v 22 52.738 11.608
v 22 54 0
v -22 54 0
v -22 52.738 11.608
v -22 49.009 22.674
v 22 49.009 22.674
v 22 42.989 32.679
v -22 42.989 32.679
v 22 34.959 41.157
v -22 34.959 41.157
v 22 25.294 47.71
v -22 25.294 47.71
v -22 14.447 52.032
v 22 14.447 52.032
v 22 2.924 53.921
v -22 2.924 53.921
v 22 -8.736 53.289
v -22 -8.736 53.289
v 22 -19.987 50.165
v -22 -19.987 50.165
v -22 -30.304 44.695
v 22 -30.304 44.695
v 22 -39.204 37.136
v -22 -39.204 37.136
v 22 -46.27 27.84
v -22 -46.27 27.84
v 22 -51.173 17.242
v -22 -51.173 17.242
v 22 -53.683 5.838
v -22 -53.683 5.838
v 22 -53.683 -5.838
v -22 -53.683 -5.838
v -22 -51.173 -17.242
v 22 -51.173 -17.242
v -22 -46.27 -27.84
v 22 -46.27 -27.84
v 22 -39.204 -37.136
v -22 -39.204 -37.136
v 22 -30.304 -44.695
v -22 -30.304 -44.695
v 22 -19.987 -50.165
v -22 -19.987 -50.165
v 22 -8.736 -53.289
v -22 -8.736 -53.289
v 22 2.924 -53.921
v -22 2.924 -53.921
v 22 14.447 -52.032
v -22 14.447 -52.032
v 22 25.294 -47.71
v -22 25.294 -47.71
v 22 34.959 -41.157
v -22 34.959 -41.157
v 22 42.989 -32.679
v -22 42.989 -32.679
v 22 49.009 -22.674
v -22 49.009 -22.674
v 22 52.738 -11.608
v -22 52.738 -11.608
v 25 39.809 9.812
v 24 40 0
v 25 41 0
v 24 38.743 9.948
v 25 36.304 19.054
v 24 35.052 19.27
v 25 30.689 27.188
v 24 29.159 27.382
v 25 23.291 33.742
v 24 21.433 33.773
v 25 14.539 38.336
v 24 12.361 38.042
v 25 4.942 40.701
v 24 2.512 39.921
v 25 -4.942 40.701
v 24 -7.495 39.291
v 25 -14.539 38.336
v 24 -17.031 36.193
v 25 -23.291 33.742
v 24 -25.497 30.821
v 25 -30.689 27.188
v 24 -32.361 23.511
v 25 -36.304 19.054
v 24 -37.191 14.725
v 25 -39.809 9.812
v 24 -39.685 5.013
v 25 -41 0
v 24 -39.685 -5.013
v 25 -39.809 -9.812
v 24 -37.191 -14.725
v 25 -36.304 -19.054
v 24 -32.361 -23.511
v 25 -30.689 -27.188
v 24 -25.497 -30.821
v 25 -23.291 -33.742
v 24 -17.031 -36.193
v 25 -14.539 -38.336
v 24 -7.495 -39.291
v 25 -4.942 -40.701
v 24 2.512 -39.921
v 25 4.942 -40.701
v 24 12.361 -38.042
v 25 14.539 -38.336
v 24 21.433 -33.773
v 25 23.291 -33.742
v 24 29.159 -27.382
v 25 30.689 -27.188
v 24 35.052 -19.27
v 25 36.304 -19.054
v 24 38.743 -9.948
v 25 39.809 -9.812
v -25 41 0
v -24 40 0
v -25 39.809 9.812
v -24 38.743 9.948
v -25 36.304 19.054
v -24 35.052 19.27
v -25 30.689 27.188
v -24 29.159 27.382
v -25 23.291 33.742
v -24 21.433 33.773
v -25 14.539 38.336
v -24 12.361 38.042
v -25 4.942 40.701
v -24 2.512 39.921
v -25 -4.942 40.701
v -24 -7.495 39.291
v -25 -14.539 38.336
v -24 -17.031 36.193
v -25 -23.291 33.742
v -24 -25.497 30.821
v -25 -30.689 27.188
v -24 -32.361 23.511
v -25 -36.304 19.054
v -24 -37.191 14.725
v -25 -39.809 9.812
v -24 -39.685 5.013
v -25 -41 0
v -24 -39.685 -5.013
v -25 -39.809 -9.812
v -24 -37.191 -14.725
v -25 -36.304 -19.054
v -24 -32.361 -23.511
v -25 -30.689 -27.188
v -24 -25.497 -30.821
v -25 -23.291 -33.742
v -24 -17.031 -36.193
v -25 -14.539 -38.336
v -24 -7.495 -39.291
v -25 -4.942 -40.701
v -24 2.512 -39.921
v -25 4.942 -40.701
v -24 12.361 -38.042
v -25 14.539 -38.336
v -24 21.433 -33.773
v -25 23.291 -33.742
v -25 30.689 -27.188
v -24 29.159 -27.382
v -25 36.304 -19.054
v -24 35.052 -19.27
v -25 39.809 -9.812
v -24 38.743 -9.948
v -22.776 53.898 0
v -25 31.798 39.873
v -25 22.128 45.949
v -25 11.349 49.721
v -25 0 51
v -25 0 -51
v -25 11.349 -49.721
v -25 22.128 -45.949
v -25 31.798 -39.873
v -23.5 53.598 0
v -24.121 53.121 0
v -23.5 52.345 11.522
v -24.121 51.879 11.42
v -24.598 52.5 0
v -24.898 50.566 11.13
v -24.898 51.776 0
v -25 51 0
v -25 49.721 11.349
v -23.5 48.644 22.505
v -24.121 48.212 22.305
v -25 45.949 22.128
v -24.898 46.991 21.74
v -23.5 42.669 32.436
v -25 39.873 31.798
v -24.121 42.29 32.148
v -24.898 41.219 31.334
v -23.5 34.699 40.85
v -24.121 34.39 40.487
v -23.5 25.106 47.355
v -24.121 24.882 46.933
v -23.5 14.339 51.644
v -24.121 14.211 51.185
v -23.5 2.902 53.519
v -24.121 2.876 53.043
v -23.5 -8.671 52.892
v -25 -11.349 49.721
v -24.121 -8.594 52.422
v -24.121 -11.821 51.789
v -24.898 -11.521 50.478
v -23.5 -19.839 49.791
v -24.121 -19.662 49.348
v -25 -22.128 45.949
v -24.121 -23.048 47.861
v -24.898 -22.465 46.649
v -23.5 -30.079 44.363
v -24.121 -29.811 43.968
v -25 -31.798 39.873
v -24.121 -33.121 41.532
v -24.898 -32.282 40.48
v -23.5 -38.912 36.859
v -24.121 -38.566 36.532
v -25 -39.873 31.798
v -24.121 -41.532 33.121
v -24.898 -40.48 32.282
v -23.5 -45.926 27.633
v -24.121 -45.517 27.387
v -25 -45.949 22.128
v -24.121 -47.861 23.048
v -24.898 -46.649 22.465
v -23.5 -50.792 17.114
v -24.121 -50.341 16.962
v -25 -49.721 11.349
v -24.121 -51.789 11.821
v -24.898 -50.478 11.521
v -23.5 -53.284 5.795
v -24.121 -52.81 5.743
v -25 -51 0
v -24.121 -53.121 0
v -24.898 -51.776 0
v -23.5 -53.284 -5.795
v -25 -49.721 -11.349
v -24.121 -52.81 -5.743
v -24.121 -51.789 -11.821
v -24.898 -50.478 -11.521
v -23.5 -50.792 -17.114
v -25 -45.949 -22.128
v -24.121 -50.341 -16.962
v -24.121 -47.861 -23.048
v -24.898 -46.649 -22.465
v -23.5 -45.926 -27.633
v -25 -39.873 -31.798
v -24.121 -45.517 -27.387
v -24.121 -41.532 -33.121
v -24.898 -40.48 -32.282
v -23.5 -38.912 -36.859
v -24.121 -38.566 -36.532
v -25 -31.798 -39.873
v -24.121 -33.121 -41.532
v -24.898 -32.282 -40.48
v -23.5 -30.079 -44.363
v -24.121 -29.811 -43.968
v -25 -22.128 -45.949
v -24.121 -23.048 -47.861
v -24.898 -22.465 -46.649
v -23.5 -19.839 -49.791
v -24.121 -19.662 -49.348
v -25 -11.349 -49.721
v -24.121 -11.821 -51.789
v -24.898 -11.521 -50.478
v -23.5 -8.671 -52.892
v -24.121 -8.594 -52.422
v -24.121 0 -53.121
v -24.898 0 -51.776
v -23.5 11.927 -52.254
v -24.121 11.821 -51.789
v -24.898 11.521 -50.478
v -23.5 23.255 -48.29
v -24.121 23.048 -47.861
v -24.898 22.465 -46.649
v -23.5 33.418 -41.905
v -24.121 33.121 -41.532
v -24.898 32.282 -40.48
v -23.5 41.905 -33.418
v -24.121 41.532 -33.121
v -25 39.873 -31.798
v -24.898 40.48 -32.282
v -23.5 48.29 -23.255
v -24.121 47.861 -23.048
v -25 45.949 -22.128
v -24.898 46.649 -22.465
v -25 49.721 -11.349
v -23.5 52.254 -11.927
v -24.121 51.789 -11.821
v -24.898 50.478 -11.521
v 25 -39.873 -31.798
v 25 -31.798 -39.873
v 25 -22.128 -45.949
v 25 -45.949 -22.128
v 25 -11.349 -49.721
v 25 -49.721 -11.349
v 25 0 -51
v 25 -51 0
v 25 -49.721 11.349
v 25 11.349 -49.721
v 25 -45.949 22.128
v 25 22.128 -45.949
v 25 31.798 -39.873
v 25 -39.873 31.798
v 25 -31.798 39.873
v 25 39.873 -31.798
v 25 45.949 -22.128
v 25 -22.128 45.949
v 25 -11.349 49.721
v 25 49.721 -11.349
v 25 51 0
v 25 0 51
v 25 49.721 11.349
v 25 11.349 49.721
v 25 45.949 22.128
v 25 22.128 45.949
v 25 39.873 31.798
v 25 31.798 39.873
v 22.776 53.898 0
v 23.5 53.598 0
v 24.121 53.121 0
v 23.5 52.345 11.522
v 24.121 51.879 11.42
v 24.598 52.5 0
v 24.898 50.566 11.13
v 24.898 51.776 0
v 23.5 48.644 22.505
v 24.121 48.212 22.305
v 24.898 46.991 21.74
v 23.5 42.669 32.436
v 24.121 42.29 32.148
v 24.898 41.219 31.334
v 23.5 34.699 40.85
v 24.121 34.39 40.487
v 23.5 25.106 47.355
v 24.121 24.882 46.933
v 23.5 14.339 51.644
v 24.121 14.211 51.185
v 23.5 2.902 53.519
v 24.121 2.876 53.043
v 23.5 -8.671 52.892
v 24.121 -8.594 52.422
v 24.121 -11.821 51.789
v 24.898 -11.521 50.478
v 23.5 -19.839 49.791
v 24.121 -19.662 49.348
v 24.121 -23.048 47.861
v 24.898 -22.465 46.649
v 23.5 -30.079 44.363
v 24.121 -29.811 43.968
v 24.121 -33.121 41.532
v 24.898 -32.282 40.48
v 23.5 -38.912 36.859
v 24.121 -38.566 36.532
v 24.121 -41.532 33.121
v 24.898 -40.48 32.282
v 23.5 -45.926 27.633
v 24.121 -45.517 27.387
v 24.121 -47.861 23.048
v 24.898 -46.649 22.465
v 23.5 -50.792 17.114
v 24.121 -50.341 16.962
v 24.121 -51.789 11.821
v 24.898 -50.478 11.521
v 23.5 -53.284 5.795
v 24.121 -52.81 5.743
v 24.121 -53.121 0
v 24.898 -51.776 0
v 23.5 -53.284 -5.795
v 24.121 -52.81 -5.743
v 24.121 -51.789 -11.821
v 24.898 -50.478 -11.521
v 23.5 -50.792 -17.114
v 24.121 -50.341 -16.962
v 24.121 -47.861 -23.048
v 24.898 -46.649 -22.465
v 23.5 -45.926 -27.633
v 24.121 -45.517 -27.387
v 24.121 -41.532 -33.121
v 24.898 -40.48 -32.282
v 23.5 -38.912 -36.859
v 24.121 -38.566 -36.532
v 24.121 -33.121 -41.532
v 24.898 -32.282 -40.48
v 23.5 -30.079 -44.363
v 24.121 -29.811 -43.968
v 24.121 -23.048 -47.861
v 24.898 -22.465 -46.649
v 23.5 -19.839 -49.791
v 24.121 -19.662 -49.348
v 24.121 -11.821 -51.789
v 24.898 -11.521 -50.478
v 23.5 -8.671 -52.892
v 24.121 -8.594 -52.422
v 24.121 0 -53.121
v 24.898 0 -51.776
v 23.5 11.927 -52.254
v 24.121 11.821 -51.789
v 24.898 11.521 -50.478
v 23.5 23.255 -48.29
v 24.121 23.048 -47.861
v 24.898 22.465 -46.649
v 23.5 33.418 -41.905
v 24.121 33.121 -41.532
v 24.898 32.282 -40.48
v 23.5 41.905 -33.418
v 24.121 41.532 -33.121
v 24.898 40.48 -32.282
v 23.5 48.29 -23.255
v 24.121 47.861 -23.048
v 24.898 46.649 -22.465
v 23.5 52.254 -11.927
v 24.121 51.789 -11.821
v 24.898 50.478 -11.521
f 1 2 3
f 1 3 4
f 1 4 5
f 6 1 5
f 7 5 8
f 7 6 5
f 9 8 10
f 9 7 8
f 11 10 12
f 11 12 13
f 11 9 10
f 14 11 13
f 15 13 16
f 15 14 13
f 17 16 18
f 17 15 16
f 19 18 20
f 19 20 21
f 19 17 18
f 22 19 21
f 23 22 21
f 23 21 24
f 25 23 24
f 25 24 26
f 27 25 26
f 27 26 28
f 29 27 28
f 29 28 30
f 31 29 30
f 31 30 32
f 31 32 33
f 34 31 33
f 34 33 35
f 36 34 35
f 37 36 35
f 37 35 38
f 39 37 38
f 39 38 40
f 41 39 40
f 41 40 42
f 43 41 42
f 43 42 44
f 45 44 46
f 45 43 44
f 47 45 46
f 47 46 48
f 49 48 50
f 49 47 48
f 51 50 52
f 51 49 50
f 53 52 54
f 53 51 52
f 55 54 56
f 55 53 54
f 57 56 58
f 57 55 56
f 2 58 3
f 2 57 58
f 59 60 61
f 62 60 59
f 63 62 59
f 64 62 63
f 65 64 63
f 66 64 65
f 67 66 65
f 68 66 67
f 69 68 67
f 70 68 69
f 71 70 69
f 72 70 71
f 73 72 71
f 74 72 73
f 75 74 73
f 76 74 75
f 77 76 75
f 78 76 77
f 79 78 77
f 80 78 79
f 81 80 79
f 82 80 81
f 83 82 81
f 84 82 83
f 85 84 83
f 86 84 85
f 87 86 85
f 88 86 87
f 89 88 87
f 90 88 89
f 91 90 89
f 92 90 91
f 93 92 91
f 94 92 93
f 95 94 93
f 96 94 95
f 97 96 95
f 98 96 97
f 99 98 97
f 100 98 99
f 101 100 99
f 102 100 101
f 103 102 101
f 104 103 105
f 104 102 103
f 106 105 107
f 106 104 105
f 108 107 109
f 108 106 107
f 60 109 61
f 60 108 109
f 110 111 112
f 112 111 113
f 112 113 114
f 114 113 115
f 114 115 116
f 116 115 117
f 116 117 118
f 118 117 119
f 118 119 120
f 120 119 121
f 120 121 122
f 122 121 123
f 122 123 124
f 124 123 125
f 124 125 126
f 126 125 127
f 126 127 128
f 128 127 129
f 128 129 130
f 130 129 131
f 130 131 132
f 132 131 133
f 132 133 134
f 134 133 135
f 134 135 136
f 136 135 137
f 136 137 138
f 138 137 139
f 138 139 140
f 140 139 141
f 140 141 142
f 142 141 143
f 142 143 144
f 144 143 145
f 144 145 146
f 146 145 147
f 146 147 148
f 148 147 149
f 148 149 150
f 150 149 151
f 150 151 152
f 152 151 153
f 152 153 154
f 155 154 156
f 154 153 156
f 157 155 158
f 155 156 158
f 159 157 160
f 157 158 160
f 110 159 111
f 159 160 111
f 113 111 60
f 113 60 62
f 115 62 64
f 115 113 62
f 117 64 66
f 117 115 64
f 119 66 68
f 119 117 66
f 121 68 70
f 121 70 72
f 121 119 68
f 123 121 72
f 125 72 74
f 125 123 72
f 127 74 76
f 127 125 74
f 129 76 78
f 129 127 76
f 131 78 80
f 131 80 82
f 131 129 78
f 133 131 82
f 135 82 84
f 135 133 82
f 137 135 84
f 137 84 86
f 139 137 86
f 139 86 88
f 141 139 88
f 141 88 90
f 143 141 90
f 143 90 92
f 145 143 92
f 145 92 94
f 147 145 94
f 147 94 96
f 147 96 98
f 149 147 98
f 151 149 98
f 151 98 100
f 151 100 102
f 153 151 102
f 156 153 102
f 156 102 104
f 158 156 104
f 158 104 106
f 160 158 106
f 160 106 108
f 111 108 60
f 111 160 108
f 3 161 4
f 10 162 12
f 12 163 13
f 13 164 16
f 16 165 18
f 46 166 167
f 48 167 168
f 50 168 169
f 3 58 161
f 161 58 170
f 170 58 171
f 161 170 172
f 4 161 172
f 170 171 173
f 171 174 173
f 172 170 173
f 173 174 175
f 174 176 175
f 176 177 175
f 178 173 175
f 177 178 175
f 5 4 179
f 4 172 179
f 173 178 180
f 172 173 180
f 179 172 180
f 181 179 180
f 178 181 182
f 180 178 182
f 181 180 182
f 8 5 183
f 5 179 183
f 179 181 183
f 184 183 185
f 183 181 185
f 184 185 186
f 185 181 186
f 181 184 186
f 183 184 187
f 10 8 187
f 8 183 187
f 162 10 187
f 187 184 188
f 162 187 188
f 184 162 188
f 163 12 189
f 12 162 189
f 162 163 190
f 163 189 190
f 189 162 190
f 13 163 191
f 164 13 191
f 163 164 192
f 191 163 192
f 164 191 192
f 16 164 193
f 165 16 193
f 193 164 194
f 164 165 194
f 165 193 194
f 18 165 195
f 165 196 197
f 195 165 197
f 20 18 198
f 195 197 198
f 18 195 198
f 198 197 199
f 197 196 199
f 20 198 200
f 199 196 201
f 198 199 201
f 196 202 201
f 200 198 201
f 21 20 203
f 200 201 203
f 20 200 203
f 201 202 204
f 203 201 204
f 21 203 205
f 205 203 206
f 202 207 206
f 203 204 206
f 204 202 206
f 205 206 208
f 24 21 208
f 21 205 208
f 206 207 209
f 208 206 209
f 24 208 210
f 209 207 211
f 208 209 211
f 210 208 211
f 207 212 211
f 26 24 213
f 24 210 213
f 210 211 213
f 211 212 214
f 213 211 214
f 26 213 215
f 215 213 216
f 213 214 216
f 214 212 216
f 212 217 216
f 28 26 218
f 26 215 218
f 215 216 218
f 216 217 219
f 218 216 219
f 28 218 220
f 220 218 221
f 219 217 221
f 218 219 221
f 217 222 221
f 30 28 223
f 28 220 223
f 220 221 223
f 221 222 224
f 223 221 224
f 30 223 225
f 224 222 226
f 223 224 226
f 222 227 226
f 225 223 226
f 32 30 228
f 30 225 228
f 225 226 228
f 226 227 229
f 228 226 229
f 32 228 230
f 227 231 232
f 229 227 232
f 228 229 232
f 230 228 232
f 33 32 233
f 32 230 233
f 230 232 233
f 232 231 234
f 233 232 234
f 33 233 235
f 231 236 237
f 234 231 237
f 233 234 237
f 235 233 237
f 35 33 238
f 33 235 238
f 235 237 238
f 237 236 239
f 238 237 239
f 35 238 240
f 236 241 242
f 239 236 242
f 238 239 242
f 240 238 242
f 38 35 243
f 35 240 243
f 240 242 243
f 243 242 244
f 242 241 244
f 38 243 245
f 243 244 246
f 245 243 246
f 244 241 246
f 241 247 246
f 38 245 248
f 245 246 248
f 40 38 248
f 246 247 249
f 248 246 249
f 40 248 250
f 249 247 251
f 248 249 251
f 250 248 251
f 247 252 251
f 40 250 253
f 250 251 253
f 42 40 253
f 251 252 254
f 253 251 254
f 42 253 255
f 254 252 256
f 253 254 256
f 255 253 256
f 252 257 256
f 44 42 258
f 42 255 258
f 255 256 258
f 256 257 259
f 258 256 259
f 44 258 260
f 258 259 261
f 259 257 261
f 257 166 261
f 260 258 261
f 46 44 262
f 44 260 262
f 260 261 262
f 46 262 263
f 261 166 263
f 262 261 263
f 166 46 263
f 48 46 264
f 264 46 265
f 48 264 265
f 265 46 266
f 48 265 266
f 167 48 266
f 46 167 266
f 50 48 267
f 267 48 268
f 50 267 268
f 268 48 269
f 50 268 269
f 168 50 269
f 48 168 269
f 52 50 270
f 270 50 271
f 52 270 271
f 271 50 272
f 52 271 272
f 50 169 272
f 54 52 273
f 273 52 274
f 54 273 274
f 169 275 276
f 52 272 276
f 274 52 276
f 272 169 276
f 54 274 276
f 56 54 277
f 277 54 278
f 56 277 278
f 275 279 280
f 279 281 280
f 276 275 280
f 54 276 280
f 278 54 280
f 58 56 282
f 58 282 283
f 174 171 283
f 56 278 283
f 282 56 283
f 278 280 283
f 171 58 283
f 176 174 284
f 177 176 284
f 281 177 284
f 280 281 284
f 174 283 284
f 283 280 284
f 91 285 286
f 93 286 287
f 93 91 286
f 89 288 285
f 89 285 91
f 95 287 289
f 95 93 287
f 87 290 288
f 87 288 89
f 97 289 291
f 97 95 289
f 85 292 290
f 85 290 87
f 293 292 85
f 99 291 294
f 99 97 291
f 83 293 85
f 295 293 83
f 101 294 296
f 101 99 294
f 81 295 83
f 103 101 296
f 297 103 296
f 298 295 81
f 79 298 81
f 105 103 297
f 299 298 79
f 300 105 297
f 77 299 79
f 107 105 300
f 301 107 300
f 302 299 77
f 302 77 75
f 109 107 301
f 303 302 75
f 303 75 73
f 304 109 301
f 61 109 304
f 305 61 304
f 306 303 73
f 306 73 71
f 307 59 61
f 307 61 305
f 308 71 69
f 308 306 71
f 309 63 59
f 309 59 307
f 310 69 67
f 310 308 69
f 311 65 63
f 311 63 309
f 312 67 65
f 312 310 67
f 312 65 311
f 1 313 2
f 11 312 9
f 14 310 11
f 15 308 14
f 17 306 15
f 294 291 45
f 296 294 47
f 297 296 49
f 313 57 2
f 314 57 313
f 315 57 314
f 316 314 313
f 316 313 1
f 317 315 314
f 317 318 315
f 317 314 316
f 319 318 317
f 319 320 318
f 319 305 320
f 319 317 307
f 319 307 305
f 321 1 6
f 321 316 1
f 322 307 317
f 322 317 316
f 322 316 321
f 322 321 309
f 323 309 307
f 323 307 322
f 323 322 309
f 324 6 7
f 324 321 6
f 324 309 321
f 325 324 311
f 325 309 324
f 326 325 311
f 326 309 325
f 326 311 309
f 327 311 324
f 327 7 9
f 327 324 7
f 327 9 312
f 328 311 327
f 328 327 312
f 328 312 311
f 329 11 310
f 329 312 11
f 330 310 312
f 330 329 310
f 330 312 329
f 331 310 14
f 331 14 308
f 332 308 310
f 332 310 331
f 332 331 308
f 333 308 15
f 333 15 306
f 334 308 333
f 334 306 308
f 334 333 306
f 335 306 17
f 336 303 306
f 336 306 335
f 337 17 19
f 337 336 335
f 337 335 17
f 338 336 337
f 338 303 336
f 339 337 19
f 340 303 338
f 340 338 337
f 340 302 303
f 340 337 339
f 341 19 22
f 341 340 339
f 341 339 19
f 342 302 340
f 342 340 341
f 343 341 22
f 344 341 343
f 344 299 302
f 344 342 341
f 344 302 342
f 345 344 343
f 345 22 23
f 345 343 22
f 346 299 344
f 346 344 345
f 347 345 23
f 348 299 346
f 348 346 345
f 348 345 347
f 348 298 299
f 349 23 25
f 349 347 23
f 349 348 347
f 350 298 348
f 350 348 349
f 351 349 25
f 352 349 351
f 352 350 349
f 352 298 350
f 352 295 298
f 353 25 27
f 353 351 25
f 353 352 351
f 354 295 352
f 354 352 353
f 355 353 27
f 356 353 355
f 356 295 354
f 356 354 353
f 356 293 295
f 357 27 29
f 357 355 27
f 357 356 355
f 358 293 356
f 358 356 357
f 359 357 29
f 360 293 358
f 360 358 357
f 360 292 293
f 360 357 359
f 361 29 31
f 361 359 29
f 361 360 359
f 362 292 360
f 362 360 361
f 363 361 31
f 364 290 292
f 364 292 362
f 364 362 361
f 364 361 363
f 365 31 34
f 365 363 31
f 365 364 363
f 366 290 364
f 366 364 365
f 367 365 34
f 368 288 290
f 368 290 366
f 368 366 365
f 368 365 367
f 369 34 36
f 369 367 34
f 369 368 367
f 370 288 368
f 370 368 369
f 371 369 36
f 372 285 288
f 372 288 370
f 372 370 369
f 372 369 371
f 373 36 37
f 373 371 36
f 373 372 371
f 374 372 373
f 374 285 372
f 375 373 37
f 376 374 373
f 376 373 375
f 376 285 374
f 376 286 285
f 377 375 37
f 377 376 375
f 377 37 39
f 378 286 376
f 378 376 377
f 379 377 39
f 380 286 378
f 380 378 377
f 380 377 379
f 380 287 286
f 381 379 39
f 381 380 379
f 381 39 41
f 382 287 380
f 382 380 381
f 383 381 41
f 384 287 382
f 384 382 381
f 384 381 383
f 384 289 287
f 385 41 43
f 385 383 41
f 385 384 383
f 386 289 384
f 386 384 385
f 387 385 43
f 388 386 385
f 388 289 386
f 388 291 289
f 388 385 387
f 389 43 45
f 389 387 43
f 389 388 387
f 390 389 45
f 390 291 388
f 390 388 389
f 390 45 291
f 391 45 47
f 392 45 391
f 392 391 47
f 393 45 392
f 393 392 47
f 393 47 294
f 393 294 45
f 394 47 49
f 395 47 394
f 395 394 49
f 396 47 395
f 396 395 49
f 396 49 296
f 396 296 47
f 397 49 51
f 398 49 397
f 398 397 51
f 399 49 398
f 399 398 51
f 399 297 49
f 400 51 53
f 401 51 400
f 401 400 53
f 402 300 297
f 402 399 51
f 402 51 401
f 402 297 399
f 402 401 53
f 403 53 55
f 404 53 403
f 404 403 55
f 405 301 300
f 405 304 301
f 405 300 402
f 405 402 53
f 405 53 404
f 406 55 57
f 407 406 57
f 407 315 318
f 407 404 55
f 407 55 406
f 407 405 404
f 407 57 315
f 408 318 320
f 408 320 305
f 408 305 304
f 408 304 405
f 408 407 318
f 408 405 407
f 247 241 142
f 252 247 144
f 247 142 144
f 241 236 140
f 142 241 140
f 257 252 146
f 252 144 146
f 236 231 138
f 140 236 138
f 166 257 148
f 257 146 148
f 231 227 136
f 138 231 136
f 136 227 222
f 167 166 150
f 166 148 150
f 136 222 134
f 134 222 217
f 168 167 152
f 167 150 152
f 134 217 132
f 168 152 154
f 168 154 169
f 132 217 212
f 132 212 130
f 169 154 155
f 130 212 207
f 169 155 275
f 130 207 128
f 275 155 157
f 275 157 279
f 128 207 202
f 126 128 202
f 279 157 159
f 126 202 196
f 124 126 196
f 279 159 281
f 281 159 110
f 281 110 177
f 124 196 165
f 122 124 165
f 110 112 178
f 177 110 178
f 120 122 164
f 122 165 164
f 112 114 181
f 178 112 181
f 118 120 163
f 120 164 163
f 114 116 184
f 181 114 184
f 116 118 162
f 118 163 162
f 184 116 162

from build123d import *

# Parameters (mm, degrees)
SKETCH008_R   = 54
SKETCH008_R_2 = 40
PAD005_DEPTH  = 25
FILLET_R      = 3
CHAMFER_SIZE  = 1


with BuildPart() as part:
    # Sketch008 → Pad005 (new body, symmetric)
    with BuildSketch(Plane.YZ):
        Circle(SKETCH008_R)
        Circle(SKETCH008_R_2, mode=Mode.SUBTRACT)
    extrude(amount=PAD005_DEPTH, both=True)

    # Fillet
    fillet_edges = [part.edges().sort_by_distance(p)[0] for p in [
        (-25, -54, 0),
        (25, -54, 0),
    ]]
    fillet(fillet_edges, radius=FILLET_R)

    # Chamfer
    chamfer_edges = [part.edges().sort_by_distance(p)[0] for p in [
        (-25, -40, 0),
        (0, 40, 0),
        (25, -40, 0),
    ]]
    chamfer(chamfer_edges, length=CHAMFER_SIZE)


solid = part.part
